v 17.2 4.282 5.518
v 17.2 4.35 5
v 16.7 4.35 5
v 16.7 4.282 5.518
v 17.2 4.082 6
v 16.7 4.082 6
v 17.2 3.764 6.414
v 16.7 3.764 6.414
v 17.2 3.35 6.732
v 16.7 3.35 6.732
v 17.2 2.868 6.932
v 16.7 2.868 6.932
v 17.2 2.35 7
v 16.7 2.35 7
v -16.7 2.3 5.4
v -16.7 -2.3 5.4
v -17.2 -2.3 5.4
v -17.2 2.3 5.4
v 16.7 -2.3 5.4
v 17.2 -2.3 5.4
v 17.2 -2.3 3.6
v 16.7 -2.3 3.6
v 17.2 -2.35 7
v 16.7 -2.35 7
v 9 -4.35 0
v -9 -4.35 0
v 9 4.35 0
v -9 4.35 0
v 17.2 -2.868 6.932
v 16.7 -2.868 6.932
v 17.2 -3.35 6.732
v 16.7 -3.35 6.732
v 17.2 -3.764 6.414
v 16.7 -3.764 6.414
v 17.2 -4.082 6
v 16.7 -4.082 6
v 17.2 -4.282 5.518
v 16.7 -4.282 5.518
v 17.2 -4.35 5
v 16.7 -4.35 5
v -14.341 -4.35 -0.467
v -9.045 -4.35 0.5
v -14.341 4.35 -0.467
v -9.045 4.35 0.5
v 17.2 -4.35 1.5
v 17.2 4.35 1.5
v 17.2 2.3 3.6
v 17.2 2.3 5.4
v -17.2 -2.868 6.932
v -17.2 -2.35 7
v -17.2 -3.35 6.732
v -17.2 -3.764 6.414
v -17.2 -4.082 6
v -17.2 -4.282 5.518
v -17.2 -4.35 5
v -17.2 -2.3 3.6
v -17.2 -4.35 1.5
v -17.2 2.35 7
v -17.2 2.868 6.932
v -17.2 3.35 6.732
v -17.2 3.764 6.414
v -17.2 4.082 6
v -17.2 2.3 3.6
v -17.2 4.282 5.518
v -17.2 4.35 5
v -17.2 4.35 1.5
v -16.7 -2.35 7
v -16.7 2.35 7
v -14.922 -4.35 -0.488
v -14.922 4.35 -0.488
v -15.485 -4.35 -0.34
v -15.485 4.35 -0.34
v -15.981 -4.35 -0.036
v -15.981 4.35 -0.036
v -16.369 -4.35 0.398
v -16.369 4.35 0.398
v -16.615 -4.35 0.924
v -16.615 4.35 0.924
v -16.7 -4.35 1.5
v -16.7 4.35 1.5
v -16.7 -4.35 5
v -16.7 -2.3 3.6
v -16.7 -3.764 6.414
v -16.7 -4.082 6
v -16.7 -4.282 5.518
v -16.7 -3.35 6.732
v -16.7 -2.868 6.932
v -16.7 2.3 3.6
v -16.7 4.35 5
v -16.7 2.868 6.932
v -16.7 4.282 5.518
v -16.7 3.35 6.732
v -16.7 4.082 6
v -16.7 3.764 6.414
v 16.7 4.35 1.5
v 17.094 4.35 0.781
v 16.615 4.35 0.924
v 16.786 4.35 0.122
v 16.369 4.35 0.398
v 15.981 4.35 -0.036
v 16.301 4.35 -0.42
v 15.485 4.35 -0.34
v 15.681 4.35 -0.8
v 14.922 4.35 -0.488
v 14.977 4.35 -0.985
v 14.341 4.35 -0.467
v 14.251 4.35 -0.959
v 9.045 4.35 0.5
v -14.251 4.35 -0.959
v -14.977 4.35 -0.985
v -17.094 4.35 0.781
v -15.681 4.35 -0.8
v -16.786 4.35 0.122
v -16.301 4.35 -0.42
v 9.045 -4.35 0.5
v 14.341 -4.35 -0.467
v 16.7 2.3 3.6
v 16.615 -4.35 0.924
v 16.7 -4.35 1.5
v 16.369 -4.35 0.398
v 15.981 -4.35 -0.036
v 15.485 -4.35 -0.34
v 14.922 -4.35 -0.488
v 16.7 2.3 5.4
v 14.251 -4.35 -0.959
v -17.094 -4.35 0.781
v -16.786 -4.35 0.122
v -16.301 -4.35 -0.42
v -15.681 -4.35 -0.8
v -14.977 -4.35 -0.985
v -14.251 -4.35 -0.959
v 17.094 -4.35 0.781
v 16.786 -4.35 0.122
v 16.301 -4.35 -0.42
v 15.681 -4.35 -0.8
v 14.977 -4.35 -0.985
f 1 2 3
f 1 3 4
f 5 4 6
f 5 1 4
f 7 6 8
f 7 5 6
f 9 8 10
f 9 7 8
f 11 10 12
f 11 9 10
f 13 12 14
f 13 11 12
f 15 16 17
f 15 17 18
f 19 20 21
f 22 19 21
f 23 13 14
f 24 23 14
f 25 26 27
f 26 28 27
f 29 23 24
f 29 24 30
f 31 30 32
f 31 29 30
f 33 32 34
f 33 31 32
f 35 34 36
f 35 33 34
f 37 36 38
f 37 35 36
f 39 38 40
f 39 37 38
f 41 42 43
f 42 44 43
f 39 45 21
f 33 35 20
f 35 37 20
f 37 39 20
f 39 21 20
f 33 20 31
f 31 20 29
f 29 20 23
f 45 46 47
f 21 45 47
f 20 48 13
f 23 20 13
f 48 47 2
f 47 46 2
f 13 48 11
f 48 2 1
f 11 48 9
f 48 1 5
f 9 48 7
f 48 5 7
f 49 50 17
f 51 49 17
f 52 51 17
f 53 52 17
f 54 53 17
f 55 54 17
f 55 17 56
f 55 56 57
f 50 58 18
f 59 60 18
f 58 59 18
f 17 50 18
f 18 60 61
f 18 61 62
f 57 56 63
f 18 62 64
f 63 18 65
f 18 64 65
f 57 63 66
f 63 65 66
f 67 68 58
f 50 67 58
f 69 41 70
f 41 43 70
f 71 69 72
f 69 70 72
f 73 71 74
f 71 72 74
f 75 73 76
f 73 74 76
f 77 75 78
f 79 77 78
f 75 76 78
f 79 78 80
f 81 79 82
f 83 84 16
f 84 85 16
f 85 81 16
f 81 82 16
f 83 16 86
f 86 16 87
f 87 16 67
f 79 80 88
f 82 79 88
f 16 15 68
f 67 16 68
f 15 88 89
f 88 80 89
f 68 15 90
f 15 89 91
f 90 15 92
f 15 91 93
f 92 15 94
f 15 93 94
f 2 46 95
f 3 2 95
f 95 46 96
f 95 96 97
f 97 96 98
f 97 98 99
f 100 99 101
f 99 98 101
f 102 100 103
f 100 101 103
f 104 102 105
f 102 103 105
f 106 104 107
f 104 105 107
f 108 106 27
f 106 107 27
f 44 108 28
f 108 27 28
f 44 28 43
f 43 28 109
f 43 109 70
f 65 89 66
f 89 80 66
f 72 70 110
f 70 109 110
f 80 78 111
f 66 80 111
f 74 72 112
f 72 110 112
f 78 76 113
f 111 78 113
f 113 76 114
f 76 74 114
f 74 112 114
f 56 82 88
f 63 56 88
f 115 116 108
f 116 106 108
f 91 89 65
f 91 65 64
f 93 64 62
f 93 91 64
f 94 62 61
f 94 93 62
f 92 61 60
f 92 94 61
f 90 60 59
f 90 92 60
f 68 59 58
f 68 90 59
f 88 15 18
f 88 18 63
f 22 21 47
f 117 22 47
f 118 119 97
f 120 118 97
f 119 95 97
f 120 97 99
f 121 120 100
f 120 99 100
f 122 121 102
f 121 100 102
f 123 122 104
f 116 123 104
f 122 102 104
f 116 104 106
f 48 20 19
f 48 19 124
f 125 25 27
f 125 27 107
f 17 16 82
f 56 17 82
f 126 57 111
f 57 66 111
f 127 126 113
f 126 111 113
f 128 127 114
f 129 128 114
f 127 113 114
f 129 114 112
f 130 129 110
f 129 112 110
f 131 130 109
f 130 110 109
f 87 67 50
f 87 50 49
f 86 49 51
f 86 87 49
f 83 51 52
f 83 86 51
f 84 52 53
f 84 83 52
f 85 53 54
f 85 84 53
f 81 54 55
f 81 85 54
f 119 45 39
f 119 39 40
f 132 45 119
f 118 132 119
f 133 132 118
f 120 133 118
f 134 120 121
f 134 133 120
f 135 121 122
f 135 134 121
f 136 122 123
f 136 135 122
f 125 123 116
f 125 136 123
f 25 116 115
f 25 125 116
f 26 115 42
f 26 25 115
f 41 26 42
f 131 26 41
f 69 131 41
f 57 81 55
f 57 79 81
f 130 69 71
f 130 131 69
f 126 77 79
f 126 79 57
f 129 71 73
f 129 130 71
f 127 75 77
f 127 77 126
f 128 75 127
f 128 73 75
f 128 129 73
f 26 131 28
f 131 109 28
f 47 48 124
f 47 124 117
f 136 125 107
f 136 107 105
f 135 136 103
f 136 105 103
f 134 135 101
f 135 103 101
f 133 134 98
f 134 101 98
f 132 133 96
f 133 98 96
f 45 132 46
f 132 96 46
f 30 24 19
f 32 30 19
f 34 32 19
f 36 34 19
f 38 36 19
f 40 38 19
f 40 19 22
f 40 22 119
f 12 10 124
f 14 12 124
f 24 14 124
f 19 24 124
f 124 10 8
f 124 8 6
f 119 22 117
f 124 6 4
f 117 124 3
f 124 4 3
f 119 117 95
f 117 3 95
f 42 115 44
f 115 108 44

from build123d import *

# Parameters (mm, degrees)
BASE_EXTRUDE_THIN_DEPTH = 4.35
SKETCH2_W               = 1.8
SKETCH2_H               = 4.6
CUT_EXTRUDE1_DEPTH      = 36.373471698


with BuildPart() as part:
    # Sketch1 → Base-Extrude-Thin (new, symmetric)
    with BuildSketch(Plane(origin=(0, 0, 0), x_dir=(1, 0, 0), z_dir=(0, 1, 0))):
        with BuildLine():
            Line((-17.2, -7), (-17.2, -1.5))
            ThreePointArc((-17.2, -1.5), (-16.30105087, 0.420061486), (-14.250691112, 0.959292891))
            Line((-14.250691112, 0.959292891), (-9, 0))
            Line((-9, 0), (9, 0))
            Line((9, 0), (14.250691112, 0.959292891))
            ThreePointArc((14.250691112, 0.959292891), (16.30105087, 0.420061486), (17.2, -1.5))
            Line((17.2, -1.5), (17.2, -7))
            Line((17.2, -7), (16.7, -7))
            Line((16.7, -7), (16.7, -1.5))
            ThreePointArc((16.7, -1.5), (15.980840696, 0.036049189), (14.340552889, 0.467434313))
            Line((14.340552889, 0.467434313), (9.045299693, -0.5))
            Line((9.045299693, -0.5), (-9.045299693, -0.5))
            Line((-9.045299693, -0.5), (-14.340552889, 0.467434313))
            ThreePointArc((-14.340552889, 0.467434313), (-15.980840696, 0.036049189), (-16.7, -1.5))
            Line((-16.7, -1.5), (-16.7, -7))
            Line((-16.7, -7), (-17.2, -7))
        make_face()
    extrude(amount=BASE_EXTRUDE_THIN_DEPTH, both=True)

    # Sketch2 → Cut-Extrude1 (cut, through all)
    with BuildSketch(Plane(origin=(17.2, 0, 0), x_dir=(0, 0, -1), z_dir=(1, 0, 0))):
        with Locations((-4.5, 0)):
            Rectangle(SKETCH2_W, SKETCH2_H)
        with BuildLine():
            Line((-7, 2.35), (-7, -2.35))
            ThreePointArc((-7, -2.35), (-6.414213562, -3.764213562), (-5, -4.35))
            Line((-5, -4.35), (-5, -8))
            Line((-5, -8), (-10, -8))
            Line((-10, -8), (-10, 8))
            Line((-10, 8), (-5, 8))
            Line((-5, 8), (-5, 4.35))
            ThreePointArc((-5, 4.35), (-6.414213562, 3.764213562), (-7, 2.35))
        make_face()
    extrude(amount=-CUT_EXTRUDE1_DEPTH, mode=Mode.SUBTRACT)


solid = part.part
